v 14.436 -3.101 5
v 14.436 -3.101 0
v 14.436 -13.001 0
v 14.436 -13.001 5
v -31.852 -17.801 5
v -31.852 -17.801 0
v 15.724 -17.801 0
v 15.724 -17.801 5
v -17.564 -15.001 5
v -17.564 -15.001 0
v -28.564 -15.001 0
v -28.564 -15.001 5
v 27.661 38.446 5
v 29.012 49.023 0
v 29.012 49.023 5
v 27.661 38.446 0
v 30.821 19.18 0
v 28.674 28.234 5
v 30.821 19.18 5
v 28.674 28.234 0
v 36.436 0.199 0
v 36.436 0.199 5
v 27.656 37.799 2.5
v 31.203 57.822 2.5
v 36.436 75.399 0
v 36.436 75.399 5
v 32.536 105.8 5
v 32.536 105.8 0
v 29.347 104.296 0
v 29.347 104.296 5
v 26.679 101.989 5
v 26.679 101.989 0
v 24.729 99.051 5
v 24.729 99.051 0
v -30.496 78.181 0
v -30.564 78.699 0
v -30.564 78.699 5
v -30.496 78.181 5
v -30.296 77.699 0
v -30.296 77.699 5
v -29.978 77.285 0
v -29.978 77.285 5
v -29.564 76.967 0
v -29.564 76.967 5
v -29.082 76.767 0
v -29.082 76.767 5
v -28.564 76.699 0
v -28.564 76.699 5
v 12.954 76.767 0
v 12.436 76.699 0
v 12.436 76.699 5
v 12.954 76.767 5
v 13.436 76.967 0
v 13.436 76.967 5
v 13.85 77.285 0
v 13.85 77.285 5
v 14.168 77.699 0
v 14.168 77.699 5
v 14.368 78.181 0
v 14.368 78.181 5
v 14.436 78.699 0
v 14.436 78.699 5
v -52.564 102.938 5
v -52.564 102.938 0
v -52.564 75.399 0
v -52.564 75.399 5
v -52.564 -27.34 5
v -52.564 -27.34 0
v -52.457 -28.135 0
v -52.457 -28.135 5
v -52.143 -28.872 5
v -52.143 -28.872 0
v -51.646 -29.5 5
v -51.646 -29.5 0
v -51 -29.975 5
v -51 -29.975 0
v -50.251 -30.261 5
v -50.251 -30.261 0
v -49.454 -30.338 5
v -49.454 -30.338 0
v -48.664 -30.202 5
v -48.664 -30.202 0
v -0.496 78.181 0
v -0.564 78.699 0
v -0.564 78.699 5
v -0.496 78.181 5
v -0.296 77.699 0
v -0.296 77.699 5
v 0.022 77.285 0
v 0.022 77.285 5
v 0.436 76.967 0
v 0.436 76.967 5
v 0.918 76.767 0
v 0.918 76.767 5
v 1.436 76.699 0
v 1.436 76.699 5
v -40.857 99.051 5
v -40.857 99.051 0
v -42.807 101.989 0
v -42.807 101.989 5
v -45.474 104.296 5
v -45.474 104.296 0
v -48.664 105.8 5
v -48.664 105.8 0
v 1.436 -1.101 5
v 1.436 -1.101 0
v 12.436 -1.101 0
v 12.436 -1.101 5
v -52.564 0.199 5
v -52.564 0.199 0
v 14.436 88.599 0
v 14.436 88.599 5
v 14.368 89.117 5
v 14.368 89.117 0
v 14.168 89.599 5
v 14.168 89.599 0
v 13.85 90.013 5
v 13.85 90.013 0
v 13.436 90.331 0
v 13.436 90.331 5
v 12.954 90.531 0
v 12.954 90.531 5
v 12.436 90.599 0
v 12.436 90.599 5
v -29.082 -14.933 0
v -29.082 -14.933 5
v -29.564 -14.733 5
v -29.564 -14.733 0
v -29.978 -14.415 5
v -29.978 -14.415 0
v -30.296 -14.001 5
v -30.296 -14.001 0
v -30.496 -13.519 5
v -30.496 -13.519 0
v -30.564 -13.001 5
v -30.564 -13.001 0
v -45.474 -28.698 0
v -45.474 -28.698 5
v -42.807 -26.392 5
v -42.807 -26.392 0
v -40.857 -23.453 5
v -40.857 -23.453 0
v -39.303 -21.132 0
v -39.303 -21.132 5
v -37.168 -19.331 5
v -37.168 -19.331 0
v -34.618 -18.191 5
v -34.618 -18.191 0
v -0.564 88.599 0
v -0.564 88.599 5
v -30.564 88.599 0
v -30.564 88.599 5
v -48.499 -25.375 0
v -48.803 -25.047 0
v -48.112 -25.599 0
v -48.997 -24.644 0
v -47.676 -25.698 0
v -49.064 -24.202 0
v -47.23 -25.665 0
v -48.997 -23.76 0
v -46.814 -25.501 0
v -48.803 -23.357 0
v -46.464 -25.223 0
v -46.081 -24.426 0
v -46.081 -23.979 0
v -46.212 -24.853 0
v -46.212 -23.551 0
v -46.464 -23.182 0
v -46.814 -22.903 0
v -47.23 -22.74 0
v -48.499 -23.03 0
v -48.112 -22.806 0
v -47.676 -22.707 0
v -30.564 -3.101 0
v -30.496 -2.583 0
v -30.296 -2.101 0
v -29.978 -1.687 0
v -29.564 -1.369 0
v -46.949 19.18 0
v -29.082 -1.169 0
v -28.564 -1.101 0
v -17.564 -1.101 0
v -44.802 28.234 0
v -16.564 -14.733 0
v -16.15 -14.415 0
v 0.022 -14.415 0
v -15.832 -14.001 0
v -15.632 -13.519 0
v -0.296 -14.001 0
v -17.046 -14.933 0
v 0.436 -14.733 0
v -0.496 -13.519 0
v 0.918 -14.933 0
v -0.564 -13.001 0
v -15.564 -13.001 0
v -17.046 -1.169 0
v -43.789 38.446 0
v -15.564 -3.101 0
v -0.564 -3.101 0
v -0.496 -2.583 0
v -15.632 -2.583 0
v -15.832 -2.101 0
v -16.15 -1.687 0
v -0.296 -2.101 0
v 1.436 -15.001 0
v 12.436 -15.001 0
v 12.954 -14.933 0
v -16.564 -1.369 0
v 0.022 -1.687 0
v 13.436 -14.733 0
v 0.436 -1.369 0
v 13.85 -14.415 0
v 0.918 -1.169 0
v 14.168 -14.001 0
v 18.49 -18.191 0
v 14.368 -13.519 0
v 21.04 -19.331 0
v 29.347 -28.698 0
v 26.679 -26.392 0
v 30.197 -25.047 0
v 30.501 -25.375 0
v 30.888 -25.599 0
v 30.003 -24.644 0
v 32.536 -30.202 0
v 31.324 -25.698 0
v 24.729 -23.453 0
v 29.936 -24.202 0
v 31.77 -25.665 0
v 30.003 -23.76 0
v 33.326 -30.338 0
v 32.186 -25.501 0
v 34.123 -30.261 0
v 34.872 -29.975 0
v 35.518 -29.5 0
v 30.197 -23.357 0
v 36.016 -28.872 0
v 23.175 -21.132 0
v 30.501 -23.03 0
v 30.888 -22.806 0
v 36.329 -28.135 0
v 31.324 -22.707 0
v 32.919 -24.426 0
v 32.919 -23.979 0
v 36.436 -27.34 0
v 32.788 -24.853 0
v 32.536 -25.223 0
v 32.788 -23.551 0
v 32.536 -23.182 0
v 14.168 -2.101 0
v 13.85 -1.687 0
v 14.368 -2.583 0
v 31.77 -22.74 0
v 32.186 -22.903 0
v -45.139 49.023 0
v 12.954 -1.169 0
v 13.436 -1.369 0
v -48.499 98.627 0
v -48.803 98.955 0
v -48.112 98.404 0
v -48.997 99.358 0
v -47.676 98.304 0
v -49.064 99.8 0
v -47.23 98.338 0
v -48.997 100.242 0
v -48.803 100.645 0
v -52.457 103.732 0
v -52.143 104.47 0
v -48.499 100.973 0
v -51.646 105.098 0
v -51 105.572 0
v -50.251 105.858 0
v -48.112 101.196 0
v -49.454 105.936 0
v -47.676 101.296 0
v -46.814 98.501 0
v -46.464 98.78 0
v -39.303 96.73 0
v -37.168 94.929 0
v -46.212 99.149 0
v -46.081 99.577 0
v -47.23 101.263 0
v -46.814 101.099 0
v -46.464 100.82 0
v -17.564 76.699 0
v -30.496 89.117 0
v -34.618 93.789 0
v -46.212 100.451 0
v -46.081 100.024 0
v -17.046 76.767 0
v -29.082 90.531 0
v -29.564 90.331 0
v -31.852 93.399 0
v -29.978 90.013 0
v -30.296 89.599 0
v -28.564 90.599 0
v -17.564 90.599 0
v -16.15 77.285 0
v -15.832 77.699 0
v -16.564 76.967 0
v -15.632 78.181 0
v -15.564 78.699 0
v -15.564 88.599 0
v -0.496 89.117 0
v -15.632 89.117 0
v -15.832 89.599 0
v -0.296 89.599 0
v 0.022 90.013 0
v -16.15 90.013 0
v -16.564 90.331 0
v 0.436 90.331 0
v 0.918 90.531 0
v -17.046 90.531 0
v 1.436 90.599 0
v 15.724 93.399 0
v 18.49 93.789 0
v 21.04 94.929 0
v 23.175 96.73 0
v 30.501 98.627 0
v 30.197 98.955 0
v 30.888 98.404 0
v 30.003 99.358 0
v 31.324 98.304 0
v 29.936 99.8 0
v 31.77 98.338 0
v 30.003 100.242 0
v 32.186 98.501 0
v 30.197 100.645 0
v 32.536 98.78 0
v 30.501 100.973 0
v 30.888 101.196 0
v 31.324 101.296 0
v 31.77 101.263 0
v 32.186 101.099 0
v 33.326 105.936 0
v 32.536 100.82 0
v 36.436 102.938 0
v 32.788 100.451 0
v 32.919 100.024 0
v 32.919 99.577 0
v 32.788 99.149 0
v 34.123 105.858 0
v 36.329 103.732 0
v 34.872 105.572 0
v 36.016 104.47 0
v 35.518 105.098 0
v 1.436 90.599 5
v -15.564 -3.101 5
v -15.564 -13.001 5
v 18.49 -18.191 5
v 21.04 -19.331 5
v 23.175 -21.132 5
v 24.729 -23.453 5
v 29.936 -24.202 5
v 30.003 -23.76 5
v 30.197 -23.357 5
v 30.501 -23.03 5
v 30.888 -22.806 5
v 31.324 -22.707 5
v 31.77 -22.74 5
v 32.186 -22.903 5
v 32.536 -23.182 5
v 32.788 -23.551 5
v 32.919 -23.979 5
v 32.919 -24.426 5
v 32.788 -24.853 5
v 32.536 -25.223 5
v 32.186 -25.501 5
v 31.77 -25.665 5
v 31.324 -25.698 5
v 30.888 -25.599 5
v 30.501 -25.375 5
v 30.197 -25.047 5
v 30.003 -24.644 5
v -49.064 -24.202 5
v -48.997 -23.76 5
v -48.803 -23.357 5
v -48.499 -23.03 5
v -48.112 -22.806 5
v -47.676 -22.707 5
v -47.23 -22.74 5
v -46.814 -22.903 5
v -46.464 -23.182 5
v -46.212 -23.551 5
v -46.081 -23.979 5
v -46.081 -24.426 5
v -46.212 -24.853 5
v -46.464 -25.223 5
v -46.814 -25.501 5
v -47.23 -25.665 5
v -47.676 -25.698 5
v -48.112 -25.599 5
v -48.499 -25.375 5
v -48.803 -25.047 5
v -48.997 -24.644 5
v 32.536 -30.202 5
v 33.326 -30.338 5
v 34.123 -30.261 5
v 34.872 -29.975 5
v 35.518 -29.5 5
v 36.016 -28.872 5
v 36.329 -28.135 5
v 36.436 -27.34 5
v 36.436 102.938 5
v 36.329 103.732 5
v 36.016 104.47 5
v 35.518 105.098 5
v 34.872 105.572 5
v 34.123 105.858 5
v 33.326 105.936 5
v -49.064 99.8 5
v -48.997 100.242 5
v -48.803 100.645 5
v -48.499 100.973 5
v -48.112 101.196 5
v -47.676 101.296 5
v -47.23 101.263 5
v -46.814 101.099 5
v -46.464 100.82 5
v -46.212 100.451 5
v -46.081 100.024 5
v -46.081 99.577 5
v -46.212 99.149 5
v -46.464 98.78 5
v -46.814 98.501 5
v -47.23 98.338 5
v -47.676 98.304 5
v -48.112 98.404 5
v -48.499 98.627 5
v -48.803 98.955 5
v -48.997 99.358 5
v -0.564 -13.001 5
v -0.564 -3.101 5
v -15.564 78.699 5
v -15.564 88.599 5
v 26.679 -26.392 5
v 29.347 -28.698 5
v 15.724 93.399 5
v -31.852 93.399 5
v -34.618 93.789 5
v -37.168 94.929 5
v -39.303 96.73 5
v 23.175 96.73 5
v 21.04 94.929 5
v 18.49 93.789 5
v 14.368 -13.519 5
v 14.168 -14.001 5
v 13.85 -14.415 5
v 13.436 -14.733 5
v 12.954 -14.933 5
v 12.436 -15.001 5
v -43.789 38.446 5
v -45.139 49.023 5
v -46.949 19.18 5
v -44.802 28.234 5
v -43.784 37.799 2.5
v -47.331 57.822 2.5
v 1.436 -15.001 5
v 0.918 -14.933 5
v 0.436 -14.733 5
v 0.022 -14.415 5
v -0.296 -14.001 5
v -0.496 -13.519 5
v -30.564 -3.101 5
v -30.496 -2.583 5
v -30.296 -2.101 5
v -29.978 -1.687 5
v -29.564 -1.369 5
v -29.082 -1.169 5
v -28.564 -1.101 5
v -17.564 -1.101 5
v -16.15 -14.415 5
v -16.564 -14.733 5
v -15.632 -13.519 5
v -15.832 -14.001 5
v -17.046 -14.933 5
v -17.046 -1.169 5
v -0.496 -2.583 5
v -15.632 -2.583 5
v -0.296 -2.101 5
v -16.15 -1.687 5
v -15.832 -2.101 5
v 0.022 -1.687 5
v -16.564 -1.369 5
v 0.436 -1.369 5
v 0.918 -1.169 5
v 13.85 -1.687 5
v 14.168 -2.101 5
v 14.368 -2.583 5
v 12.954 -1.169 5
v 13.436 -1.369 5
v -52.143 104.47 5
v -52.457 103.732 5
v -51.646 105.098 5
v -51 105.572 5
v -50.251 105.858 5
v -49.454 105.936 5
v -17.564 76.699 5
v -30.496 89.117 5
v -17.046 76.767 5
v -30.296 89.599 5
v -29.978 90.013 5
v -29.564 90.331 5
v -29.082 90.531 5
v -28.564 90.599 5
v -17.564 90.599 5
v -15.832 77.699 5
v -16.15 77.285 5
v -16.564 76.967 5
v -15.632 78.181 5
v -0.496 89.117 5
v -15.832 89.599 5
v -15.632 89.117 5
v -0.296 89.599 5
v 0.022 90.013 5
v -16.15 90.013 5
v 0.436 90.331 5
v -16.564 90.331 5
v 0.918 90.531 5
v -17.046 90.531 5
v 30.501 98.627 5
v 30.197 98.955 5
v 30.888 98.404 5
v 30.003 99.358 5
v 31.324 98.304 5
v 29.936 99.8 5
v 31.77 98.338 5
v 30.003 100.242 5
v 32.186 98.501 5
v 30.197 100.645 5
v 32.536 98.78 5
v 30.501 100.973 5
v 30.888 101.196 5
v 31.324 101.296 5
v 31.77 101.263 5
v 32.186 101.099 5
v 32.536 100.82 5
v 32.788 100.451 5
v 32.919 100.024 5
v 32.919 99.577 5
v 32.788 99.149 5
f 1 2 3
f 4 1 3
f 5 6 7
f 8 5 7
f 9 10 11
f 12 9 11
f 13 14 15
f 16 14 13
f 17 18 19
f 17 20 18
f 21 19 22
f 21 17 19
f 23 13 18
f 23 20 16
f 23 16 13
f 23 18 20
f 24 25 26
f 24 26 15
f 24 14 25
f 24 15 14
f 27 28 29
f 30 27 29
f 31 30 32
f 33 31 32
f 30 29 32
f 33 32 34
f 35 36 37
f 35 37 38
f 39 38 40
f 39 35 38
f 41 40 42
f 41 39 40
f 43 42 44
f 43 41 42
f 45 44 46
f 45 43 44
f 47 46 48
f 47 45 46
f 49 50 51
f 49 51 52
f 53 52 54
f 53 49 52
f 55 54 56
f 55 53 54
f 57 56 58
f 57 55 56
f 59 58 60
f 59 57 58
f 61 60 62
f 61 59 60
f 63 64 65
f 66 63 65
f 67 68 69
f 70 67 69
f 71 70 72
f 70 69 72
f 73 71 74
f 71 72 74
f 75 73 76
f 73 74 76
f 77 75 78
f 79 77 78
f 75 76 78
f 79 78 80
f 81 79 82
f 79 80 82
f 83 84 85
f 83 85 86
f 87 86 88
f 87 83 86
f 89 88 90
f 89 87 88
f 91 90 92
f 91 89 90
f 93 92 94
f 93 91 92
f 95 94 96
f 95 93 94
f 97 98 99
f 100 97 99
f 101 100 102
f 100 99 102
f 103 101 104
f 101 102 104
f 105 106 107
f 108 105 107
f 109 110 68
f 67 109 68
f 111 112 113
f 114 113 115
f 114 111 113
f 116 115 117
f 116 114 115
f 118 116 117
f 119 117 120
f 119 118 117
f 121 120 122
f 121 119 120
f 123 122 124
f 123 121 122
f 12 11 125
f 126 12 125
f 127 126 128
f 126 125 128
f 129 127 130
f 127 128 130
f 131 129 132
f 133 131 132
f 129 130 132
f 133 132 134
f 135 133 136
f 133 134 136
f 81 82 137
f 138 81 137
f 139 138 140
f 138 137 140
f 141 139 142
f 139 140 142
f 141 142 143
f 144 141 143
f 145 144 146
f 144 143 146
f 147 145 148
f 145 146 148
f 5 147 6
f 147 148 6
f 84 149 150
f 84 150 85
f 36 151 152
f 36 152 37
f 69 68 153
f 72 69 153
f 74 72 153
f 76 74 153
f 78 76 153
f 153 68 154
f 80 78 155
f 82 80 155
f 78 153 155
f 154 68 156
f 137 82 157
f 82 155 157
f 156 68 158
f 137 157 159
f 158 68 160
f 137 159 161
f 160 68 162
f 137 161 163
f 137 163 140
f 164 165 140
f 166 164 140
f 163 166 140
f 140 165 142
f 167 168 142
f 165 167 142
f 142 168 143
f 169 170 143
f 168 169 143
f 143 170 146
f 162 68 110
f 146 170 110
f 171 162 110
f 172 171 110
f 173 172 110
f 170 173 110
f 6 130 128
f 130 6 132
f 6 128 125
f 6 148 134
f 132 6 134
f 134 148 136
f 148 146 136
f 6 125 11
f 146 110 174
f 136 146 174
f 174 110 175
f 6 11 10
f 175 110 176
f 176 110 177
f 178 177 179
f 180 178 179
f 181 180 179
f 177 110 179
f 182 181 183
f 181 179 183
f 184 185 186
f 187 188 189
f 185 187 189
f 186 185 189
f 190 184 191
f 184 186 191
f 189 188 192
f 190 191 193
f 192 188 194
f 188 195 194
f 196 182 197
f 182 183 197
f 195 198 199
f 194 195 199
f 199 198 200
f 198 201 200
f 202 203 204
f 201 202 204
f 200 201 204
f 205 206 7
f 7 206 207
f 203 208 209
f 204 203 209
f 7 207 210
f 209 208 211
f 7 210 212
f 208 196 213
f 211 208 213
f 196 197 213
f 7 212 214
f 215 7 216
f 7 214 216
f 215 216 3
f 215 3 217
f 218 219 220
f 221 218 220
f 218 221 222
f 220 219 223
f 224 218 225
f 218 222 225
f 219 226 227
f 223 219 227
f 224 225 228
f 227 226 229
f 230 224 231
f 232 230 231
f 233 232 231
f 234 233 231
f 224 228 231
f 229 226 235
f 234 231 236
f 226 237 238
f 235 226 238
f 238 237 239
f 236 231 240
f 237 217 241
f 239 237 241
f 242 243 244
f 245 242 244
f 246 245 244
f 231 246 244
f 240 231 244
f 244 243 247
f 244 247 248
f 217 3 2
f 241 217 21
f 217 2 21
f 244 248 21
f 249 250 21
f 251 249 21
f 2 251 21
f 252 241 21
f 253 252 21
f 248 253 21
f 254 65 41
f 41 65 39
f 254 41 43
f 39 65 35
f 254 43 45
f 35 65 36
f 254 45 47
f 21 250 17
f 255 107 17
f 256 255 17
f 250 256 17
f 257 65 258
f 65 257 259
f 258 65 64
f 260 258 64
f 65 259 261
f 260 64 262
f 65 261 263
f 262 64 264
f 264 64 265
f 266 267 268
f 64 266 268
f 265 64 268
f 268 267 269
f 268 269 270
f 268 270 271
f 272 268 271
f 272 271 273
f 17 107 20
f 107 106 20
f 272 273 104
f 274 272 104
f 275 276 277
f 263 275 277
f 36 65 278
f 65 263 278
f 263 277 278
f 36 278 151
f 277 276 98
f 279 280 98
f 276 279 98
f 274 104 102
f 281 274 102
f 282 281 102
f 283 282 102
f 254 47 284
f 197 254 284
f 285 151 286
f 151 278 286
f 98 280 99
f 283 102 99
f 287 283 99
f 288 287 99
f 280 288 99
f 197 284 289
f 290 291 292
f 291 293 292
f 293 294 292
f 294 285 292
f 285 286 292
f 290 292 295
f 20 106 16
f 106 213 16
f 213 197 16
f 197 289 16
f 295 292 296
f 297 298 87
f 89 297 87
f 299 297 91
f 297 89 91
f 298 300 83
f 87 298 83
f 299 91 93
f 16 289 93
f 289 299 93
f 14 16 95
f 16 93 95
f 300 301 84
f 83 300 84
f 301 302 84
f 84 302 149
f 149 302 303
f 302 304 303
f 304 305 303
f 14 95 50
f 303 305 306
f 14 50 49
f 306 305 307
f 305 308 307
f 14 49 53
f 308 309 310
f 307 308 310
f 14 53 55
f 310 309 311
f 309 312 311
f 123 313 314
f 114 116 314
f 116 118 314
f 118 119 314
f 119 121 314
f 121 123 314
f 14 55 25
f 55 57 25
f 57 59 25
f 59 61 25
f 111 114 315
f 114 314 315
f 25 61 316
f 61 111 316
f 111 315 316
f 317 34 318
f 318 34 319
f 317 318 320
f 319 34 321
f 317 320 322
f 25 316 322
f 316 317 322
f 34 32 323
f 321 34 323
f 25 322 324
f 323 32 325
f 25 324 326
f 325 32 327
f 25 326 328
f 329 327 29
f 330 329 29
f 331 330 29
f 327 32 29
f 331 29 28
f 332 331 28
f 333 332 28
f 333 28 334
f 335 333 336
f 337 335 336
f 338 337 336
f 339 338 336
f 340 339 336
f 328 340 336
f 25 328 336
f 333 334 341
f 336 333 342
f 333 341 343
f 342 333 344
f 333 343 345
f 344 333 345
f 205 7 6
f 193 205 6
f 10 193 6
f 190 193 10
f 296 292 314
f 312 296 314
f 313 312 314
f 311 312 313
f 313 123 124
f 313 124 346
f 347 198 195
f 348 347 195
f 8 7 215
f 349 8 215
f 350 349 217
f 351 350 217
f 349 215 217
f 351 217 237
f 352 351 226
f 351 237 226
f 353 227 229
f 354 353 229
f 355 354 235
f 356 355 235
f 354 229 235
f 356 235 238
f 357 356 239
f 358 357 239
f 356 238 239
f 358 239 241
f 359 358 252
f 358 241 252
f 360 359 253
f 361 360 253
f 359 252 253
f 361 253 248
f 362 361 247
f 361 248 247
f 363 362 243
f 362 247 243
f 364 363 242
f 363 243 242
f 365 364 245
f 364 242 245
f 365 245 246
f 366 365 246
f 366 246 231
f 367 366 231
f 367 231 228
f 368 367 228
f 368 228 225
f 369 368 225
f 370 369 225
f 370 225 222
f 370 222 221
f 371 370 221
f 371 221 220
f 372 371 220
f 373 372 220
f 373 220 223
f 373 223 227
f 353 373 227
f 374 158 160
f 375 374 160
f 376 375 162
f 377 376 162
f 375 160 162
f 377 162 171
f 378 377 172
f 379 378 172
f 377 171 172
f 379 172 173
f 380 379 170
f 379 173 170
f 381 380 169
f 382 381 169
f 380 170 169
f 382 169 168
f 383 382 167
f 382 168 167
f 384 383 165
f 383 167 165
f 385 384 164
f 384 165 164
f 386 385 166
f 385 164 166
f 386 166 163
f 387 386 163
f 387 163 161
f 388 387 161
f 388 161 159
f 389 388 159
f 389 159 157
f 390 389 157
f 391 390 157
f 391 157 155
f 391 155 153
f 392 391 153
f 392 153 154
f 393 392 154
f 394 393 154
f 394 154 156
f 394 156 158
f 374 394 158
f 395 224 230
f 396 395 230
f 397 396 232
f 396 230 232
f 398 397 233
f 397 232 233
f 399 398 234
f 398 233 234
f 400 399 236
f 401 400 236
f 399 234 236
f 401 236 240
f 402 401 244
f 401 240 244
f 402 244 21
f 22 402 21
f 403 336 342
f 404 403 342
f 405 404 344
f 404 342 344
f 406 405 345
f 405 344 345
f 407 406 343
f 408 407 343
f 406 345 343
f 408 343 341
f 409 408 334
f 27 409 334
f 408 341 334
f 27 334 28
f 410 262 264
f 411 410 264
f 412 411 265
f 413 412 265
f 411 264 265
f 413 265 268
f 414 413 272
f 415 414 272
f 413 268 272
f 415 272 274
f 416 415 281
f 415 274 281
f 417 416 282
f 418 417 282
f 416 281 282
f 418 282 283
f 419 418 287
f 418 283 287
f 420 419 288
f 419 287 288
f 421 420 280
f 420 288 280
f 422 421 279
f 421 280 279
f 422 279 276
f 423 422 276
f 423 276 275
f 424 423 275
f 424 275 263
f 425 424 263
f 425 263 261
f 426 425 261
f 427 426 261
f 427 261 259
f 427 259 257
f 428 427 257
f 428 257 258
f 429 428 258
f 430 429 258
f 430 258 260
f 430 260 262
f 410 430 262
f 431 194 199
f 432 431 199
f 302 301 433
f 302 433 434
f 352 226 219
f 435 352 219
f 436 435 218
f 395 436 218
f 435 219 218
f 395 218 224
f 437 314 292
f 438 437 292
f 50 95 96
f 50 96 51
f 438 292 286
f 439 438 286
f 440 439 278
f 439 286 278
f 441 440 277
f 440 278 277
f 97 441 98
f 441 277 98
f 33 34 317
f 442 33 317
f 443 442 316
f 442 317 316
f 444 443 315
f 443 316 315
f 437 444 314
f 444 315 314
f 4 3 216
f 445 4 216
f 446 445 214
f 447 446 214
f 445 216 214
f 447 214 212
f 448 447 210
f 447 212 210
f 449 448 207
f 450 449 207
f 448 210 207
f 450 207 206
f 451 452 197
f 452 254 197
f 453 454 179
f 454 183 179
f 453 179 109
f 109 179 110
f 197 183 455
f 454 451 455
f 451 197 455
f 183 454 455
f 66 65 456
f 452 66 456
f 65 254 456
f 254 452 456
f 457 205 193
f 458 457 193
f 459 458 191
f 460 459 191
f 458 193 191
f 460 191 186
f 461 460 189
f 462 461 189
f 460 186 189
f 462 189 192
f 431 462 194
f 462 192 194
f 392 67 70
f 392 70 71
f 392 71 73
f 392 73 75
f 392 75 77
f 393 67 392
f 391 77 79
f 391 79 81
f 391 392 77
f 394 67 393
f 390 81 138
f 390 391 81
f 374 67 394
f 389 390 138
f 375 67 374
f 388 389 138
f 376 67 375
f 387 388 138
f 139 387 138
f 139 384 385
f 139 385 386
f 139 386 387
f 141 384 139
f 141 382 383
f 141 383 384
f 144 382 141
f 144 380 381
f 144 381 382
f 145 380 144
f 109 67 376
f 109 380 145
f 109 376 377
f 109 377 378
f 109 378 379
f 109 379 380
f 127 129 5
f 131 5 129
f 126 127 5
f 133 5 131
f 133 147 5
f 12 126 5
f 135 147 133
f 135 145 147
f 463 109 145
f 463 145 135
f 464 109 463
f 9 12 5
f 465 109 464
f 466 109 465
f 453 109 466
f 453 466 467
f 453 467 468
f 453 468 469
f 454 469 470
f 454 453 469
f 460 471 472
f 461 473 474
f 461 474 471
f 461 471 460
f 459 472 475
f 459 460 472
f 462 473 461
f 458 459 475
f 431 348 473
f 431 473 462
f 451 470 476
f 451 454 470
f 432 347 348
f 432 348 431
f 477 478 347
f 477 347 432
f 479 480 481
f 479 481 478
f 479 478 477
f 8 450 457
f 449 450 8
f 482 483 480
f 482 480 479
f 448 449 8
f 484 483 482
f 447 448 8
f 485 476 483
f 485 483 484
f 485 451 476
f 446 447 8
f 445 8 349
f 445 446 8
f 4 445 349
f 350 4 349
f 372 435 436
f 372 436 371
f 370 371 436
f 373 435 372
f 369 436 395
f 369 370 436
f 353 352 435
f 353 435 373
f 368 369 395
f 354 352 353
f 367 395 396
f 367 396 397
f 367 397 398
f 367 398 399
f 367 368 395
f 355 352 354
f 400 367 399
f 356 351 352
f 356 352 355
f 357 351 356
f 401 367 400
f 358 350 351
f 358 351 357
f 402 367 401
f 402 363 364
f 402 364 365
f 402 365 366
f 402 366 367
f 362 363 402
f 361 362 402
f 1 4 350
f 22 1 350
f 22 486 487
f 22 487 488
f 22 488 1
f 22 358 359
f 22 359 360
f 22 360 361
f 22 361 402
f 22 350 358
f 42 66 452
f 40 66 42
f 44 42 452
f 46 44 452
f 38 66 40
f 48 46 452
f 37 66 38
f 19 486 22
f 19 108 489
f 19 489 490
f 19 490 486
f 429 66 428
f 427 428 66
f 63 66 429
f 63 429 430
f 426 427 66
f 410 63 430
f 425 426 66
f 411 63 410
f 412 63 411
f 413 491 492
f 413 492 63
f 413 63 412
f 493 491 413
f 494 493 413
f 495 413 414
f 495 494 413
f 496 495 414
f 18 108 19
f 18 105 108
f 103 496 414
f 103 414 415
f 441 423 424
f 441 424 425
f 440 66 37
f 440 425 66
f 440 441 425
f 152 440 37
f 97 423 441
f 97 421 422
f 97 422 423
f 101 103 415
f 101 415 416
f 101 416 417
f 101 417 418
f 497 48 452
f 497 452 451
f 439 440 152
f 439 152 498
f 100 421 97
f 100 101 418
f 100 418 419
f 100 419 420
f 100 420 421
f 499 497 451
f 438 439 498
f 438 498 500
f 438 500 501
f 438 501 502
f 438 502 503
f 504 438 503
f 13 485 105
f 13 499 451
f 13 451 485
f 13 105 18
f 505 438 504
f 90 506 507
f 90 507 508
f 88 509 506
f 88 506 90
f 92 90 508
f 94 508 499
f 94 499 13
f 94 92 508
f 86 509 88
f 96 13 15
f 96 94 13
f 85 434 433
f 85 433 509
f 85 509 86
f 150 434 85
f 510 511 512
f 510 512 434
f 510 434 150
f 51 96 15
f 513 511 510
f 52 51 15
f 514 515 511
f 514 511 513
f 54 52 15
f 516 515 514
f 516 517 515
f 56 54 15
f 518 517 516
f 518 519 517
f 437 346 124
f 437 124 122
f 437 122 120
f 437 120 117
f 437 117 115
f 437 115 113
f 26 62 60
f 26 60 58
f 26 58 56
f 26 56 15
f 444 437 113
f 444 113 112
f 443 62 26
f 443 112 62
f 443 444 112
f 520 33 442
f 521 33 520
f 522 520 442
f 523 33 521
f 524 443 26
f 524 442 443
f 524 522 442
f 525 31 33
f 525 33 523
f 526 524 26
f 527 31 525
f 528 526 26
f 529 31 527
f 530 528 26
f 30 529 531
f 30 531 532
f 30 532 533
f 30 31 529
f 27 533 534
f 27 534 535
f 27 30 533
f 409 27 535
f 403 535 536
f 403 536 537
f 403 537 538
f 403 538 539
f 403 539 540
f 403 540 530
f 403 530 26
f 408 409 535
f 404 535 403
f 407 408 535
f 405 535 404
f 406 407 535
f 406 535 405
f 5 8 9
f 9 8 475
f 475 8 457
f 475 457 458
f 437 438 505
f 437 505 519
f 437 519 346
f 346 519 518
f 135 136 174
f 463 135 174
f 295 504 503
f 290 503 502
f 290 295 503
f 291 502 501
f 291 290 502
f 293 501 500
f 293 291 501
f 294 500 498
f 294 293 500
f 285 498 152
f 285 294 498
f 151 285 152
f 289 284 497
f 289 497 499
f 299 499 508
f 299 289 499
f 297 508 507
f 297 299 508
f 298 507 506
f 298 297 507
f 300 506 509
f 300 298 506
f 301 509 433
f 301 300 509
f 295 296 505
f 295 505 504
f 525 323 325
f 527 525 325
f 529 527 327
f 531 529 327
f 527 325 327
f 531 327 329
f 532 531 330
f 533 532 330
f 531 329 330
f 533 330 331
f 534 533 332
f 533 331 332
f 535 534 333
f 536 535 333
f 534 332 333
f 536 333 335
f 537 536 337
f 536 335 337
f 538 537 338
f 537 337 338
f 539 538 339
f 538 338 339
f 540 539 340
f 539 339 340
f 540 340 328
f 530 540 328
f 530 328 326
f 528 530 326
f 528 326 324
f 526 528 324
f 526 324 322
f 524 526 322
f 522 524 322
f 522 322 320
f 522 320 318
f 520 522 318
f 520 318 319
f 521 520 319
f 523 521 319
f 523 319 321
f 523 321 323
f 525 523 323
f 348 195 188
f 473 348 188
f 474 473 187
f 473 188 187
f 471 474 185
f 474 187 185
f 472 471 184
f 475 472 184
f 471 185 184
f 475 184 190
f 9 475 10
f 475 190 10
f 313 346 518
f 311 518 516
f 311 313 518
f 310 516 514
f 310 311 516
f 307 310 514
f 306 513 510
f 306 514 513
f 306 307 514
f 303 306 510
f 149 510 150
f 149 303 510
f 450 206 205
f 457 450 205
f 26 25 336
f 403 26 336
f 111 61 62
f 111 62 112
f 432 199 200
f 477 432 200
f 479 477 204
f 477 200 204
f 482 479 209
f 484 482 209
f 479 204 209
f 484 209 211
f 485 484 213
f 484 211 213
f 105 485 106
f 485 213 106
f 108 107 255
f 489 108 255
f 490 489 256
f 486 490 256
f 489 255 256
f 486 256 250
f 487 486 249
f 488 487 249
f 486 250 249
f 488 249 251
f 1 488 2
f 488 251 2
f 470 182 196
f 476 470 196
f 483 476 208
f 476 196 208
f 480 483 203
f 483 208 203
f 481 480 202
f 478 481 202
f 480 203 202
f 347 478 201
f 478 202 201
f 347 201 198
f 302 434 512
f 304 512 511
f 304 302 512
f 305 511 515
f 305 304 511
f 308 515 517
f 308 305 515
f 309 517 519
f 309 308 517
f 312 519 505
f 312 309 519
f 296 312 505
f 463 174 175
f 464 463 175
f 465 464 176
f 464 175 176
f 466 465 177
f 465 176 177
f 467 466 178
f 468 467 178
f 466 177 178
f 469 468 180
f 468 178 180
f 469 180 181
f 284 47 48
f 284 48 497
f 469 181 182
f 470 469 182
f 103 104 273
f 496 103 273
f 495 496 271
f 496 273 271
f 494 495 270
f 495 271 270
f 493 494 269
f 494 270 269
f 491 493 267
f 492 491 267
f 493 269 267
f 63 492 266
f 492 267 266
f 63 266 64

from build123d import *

# Parameters (mm, degrees)
RESSALTO_EXTRUS_O3_DEPTH = 5
ESBO_O4_R                = 1.5
CORTE_EXTRUS_O3_DEPTH    = 10


with BuildPart() as part:
    # Esboço1 → Ressalto-extrusão3 (new body)
    with BuildSketch(Plane.XY):
        with BuildLine():
            Line((-31.851570772, -17.801096987), (-27.063885949, -17.801096987))
            Line((-27.063885949, -17.801096987), (10.936114051, -17.801096987))
            Line((10.936114051, -17.801096987), (15.723798874, -17.801096987))
            ThreePointArc((15.723798874, -17.801096987), (21.039894205, -19.331201448), (24.729153299, -23.4532709))
            ThreePointArc((24.729153299, -23.4532709), (27.934250919, -27.635644423), (32.536114051, -30.202306605))
            ThreePointArc((32.536114051, -30.202306605), (35.210937986, -29.759166326), (36.436114051, -27.340489001))
            Line((36.436114051, -27.340489001), (36.436114051, -17.801096987))
            Line((36.436114051, -17.801096987), (36.436114051, 0.198903013))
            add(Edge.make_bspline(
                [(36.436114051, 75.398903013), (24.729153299, 37.798903013), (36.436114051, 0.198903013)],
                knots=[0, 0, 0, 1, 1, 1], degree=2, weights=[1, 3, 1]))
            Line((36.436114051, 75.398903013), (36.436114051, 93.398903013))
            Line((36.436114051, 93.398903013), (36.436114051, 102.938295027))
            ThreePointArc((36.436114051, 102.938295027), (35.210937986, 105.356972352), (32.536114051, 105.800112631))
            ThreePointArc((32.536114051, 105.800112631), (27.934250919, 103.23345045), (24.729153299, 99.051076926))
            ThreePointArc((24.729153299, 99.051076926), (21.039894205, 94.929007474), (15.723798874, 93.398903013))
            Line((15.723798874, 93.398903013), (10.936114051, 93.398903013))
            Line((10.936114051, 93.398903013), (-27.063885949, 93.398903013))
            Line((-27.063885949, 93.398903013), (-31.851570772, 93.398903013))
            ThreePointArc((-31.851570772, 93.398903013), (-37.167666102, 94.929007474), (-40.856925197, 99.051076926))
            ThreePointArc((-40.856925197, 99.051076926), (-44.062022817, 103.23345045), (-48.663885949, 105.800112631))
            ThreePointArc((-48.663885949, 105.800112631), (-51.338709884, 105.356972352), (-52.563885949, 102.938295027))
            Line((-52.563885949, 102.938295027), (-52.563885949, 93.398903013))
            Line((-52.563885949, 93.398903013), (-52.563885949, 75.398903013))
            add(Edge.make_bspline(
                [(-52.563885949, 75.398903013), (-40.856925197, 37.798903013), (-52.563885949, 0.198903013)],
                knots=[0, 0, 0, 1, 1, 1], degree=2, weights=[1, 3, 1]))
            Line((-52.563885949, 0.198903013), (-52.563885949, -17.801096987))
            Line((-52.563885949, -17.801096987), (-52.563885949, -27.340489001))
            ThreePointArc((-52.563885949, -27.340489001), (-51.338709884, -29.759166326), (-48.663885949, -30.202306605))
            ThreePointArc((-48.663885949, -30.202306605), (-44.062022817, -27.635644423), (-40.856925197, -23.4532709))
            ThreePointArc((-40.856925197, -23.4532709), (-37.167666102, -19.331201448), (-31.851570772, -17.801096987))
        make_face()
    extrude(amount=RESSALTO_EXTRUS_O3_DEPTH)

    # Esboço4 → Corte-extrusão3 (cut)
    with BuildSketch(Plane(origin=(0, 0, 0), x_dir=(-1, 0, 0), z_dir=(0, 0, -1))):
        with Locations((-31.436114051, 99.800112631)):
            Circle(ESBO_O4_R)
        with Locations((47.563885949, 99.800112631)):
            Circle(ESBO_O4_R)
        with Locations((47.563885949, -24.202306605)):
            Circle(ESBO_O4_R)
        with Locations((-31.436114051, -24.202306605)):
            Circle(ESBO_O4_R)
        with BuildLine():
            Line((-12.436114051, 90.598903013), (-1.436114051, 90.598903013))
            ThreePointArc((-1.436114051, 90.598903013), (-0.021900489, 90.013116575), (0.563885949, 88.598903013))
            Line((0.563885949, 88.598903013), (0.563885949, 78.698903013))
            ThreePointArc((0.563885949, 78.698903013), (-0.021900489, 77.284689451), (-1.436114051, 76.698903013))
            Line((-1.436114051, 76.698903013), (-12.436114051, 76.698903013))
            ThreePointArc((-12.436114051, 76.698903013), (-13.850327613, 77.284689451), (-14.436114051, 78.698903013))
            Line((-14.436114051, 78.698903013), (-14.436114051, 88.598903013))
            ThreePointArc((-14.436114051, 88.598903013), (-13.850327613, 90.013116575), (-12.436114051, 90.598903013))
        make_face()
        with BuildLine():
            Line((17.563885949, 90.598903013), (28.563885949, 90.598903013))
            ThreePointArc((28.563885949, 90.598903013), (29.978099511, 90.013116575), (30.563885949, 88.598903013))
            Line((30.563885949, 88.598903013), (30.563885949, 78.698903013))
            ThreePointArc((30.563885949, 78.698903013), (29.978099511, 77.284689451), (28.563885949, 76.698903013))
            Line((28.563885949, 76.698903013), (17.563885949, 76.698903013))
            ThreePointArc((17.563885949, 76.698903013), (16.149672387, 77.284689451), (15.563885949, 78.698903013))
            Line((15.563885949, 78.698903013), (15.563885949, 88.598903013))
            ThreePointArc((15.563885949, 88.598903013), (16.149672387, 90.013116575), (17.563885949, 90.598903013))
        make_face()
        with BuildLine():
            Line((30.563885949, -13.001096987), (30.563885949, -3.101096987))
            ThreePointArc((30.563885949, -3.101096987), (29.978099511, -1.686883425), (28.563885949, -1.101096987))
            Line((28.563885949, -1.101096987), (17.563885949, -1.101096987))
            ThreePointArc((17.563885949, -1.101096987), (16.149672387, -1.686883425), (15.563885949, -3.101096987))
            Line((15.563885949, -3.101096987), (15.563885949, -13.001096987))
            ThreePointArc((15.563885949, -13.001096987), (16.149672387, -14.415310549), (17.563885949, -15.001096987))
            Line((17.563885949, -15.001096987), (28.563885949, -15.001096987))
            ThreePointArc((28.563885949, -15.001096987), (29.978099511, -14.415310549), (30.563885949, -13.001096987))
        make_face()
        with BuildLine():
            Line((0.563885949, -13.001096987), (0.563885949, -3.101096987))
            ThreePointArc((0.563885949, -3.101096987), (-0.021900489, -1.686883425), (-1.436114051, -1.101096987))
            Line((-1.436114051, -1.101096987), (-12.436114051, -1.101096987))
            ThreePointArc((-12.436114051, -1.101096987), (-13.850327613, -1.686883425), (-14.436114051, -3.101096987))
            Line((-14.436114051, -3.101096987), (-14.436114051, -13.001096987))
            ThreePointArc((-14.436114051, -13.001096987), (-13.850327613, -14.415310549), (-12.436114051, -15.001096987))
            Line((-12.436114051, -15.001096987), (-1.436114051, -15.001096987))
            ThreePointArc((-1.436114051, -15.001096987), (-0.021900489, -14.415310549), (0.563885949, -13.001096987))
        make_face()
    extrude(amount=-CORTE_EXTRUS_O3_DEPTH, mode=Mode.SUBTRACT)


solid = part.part
